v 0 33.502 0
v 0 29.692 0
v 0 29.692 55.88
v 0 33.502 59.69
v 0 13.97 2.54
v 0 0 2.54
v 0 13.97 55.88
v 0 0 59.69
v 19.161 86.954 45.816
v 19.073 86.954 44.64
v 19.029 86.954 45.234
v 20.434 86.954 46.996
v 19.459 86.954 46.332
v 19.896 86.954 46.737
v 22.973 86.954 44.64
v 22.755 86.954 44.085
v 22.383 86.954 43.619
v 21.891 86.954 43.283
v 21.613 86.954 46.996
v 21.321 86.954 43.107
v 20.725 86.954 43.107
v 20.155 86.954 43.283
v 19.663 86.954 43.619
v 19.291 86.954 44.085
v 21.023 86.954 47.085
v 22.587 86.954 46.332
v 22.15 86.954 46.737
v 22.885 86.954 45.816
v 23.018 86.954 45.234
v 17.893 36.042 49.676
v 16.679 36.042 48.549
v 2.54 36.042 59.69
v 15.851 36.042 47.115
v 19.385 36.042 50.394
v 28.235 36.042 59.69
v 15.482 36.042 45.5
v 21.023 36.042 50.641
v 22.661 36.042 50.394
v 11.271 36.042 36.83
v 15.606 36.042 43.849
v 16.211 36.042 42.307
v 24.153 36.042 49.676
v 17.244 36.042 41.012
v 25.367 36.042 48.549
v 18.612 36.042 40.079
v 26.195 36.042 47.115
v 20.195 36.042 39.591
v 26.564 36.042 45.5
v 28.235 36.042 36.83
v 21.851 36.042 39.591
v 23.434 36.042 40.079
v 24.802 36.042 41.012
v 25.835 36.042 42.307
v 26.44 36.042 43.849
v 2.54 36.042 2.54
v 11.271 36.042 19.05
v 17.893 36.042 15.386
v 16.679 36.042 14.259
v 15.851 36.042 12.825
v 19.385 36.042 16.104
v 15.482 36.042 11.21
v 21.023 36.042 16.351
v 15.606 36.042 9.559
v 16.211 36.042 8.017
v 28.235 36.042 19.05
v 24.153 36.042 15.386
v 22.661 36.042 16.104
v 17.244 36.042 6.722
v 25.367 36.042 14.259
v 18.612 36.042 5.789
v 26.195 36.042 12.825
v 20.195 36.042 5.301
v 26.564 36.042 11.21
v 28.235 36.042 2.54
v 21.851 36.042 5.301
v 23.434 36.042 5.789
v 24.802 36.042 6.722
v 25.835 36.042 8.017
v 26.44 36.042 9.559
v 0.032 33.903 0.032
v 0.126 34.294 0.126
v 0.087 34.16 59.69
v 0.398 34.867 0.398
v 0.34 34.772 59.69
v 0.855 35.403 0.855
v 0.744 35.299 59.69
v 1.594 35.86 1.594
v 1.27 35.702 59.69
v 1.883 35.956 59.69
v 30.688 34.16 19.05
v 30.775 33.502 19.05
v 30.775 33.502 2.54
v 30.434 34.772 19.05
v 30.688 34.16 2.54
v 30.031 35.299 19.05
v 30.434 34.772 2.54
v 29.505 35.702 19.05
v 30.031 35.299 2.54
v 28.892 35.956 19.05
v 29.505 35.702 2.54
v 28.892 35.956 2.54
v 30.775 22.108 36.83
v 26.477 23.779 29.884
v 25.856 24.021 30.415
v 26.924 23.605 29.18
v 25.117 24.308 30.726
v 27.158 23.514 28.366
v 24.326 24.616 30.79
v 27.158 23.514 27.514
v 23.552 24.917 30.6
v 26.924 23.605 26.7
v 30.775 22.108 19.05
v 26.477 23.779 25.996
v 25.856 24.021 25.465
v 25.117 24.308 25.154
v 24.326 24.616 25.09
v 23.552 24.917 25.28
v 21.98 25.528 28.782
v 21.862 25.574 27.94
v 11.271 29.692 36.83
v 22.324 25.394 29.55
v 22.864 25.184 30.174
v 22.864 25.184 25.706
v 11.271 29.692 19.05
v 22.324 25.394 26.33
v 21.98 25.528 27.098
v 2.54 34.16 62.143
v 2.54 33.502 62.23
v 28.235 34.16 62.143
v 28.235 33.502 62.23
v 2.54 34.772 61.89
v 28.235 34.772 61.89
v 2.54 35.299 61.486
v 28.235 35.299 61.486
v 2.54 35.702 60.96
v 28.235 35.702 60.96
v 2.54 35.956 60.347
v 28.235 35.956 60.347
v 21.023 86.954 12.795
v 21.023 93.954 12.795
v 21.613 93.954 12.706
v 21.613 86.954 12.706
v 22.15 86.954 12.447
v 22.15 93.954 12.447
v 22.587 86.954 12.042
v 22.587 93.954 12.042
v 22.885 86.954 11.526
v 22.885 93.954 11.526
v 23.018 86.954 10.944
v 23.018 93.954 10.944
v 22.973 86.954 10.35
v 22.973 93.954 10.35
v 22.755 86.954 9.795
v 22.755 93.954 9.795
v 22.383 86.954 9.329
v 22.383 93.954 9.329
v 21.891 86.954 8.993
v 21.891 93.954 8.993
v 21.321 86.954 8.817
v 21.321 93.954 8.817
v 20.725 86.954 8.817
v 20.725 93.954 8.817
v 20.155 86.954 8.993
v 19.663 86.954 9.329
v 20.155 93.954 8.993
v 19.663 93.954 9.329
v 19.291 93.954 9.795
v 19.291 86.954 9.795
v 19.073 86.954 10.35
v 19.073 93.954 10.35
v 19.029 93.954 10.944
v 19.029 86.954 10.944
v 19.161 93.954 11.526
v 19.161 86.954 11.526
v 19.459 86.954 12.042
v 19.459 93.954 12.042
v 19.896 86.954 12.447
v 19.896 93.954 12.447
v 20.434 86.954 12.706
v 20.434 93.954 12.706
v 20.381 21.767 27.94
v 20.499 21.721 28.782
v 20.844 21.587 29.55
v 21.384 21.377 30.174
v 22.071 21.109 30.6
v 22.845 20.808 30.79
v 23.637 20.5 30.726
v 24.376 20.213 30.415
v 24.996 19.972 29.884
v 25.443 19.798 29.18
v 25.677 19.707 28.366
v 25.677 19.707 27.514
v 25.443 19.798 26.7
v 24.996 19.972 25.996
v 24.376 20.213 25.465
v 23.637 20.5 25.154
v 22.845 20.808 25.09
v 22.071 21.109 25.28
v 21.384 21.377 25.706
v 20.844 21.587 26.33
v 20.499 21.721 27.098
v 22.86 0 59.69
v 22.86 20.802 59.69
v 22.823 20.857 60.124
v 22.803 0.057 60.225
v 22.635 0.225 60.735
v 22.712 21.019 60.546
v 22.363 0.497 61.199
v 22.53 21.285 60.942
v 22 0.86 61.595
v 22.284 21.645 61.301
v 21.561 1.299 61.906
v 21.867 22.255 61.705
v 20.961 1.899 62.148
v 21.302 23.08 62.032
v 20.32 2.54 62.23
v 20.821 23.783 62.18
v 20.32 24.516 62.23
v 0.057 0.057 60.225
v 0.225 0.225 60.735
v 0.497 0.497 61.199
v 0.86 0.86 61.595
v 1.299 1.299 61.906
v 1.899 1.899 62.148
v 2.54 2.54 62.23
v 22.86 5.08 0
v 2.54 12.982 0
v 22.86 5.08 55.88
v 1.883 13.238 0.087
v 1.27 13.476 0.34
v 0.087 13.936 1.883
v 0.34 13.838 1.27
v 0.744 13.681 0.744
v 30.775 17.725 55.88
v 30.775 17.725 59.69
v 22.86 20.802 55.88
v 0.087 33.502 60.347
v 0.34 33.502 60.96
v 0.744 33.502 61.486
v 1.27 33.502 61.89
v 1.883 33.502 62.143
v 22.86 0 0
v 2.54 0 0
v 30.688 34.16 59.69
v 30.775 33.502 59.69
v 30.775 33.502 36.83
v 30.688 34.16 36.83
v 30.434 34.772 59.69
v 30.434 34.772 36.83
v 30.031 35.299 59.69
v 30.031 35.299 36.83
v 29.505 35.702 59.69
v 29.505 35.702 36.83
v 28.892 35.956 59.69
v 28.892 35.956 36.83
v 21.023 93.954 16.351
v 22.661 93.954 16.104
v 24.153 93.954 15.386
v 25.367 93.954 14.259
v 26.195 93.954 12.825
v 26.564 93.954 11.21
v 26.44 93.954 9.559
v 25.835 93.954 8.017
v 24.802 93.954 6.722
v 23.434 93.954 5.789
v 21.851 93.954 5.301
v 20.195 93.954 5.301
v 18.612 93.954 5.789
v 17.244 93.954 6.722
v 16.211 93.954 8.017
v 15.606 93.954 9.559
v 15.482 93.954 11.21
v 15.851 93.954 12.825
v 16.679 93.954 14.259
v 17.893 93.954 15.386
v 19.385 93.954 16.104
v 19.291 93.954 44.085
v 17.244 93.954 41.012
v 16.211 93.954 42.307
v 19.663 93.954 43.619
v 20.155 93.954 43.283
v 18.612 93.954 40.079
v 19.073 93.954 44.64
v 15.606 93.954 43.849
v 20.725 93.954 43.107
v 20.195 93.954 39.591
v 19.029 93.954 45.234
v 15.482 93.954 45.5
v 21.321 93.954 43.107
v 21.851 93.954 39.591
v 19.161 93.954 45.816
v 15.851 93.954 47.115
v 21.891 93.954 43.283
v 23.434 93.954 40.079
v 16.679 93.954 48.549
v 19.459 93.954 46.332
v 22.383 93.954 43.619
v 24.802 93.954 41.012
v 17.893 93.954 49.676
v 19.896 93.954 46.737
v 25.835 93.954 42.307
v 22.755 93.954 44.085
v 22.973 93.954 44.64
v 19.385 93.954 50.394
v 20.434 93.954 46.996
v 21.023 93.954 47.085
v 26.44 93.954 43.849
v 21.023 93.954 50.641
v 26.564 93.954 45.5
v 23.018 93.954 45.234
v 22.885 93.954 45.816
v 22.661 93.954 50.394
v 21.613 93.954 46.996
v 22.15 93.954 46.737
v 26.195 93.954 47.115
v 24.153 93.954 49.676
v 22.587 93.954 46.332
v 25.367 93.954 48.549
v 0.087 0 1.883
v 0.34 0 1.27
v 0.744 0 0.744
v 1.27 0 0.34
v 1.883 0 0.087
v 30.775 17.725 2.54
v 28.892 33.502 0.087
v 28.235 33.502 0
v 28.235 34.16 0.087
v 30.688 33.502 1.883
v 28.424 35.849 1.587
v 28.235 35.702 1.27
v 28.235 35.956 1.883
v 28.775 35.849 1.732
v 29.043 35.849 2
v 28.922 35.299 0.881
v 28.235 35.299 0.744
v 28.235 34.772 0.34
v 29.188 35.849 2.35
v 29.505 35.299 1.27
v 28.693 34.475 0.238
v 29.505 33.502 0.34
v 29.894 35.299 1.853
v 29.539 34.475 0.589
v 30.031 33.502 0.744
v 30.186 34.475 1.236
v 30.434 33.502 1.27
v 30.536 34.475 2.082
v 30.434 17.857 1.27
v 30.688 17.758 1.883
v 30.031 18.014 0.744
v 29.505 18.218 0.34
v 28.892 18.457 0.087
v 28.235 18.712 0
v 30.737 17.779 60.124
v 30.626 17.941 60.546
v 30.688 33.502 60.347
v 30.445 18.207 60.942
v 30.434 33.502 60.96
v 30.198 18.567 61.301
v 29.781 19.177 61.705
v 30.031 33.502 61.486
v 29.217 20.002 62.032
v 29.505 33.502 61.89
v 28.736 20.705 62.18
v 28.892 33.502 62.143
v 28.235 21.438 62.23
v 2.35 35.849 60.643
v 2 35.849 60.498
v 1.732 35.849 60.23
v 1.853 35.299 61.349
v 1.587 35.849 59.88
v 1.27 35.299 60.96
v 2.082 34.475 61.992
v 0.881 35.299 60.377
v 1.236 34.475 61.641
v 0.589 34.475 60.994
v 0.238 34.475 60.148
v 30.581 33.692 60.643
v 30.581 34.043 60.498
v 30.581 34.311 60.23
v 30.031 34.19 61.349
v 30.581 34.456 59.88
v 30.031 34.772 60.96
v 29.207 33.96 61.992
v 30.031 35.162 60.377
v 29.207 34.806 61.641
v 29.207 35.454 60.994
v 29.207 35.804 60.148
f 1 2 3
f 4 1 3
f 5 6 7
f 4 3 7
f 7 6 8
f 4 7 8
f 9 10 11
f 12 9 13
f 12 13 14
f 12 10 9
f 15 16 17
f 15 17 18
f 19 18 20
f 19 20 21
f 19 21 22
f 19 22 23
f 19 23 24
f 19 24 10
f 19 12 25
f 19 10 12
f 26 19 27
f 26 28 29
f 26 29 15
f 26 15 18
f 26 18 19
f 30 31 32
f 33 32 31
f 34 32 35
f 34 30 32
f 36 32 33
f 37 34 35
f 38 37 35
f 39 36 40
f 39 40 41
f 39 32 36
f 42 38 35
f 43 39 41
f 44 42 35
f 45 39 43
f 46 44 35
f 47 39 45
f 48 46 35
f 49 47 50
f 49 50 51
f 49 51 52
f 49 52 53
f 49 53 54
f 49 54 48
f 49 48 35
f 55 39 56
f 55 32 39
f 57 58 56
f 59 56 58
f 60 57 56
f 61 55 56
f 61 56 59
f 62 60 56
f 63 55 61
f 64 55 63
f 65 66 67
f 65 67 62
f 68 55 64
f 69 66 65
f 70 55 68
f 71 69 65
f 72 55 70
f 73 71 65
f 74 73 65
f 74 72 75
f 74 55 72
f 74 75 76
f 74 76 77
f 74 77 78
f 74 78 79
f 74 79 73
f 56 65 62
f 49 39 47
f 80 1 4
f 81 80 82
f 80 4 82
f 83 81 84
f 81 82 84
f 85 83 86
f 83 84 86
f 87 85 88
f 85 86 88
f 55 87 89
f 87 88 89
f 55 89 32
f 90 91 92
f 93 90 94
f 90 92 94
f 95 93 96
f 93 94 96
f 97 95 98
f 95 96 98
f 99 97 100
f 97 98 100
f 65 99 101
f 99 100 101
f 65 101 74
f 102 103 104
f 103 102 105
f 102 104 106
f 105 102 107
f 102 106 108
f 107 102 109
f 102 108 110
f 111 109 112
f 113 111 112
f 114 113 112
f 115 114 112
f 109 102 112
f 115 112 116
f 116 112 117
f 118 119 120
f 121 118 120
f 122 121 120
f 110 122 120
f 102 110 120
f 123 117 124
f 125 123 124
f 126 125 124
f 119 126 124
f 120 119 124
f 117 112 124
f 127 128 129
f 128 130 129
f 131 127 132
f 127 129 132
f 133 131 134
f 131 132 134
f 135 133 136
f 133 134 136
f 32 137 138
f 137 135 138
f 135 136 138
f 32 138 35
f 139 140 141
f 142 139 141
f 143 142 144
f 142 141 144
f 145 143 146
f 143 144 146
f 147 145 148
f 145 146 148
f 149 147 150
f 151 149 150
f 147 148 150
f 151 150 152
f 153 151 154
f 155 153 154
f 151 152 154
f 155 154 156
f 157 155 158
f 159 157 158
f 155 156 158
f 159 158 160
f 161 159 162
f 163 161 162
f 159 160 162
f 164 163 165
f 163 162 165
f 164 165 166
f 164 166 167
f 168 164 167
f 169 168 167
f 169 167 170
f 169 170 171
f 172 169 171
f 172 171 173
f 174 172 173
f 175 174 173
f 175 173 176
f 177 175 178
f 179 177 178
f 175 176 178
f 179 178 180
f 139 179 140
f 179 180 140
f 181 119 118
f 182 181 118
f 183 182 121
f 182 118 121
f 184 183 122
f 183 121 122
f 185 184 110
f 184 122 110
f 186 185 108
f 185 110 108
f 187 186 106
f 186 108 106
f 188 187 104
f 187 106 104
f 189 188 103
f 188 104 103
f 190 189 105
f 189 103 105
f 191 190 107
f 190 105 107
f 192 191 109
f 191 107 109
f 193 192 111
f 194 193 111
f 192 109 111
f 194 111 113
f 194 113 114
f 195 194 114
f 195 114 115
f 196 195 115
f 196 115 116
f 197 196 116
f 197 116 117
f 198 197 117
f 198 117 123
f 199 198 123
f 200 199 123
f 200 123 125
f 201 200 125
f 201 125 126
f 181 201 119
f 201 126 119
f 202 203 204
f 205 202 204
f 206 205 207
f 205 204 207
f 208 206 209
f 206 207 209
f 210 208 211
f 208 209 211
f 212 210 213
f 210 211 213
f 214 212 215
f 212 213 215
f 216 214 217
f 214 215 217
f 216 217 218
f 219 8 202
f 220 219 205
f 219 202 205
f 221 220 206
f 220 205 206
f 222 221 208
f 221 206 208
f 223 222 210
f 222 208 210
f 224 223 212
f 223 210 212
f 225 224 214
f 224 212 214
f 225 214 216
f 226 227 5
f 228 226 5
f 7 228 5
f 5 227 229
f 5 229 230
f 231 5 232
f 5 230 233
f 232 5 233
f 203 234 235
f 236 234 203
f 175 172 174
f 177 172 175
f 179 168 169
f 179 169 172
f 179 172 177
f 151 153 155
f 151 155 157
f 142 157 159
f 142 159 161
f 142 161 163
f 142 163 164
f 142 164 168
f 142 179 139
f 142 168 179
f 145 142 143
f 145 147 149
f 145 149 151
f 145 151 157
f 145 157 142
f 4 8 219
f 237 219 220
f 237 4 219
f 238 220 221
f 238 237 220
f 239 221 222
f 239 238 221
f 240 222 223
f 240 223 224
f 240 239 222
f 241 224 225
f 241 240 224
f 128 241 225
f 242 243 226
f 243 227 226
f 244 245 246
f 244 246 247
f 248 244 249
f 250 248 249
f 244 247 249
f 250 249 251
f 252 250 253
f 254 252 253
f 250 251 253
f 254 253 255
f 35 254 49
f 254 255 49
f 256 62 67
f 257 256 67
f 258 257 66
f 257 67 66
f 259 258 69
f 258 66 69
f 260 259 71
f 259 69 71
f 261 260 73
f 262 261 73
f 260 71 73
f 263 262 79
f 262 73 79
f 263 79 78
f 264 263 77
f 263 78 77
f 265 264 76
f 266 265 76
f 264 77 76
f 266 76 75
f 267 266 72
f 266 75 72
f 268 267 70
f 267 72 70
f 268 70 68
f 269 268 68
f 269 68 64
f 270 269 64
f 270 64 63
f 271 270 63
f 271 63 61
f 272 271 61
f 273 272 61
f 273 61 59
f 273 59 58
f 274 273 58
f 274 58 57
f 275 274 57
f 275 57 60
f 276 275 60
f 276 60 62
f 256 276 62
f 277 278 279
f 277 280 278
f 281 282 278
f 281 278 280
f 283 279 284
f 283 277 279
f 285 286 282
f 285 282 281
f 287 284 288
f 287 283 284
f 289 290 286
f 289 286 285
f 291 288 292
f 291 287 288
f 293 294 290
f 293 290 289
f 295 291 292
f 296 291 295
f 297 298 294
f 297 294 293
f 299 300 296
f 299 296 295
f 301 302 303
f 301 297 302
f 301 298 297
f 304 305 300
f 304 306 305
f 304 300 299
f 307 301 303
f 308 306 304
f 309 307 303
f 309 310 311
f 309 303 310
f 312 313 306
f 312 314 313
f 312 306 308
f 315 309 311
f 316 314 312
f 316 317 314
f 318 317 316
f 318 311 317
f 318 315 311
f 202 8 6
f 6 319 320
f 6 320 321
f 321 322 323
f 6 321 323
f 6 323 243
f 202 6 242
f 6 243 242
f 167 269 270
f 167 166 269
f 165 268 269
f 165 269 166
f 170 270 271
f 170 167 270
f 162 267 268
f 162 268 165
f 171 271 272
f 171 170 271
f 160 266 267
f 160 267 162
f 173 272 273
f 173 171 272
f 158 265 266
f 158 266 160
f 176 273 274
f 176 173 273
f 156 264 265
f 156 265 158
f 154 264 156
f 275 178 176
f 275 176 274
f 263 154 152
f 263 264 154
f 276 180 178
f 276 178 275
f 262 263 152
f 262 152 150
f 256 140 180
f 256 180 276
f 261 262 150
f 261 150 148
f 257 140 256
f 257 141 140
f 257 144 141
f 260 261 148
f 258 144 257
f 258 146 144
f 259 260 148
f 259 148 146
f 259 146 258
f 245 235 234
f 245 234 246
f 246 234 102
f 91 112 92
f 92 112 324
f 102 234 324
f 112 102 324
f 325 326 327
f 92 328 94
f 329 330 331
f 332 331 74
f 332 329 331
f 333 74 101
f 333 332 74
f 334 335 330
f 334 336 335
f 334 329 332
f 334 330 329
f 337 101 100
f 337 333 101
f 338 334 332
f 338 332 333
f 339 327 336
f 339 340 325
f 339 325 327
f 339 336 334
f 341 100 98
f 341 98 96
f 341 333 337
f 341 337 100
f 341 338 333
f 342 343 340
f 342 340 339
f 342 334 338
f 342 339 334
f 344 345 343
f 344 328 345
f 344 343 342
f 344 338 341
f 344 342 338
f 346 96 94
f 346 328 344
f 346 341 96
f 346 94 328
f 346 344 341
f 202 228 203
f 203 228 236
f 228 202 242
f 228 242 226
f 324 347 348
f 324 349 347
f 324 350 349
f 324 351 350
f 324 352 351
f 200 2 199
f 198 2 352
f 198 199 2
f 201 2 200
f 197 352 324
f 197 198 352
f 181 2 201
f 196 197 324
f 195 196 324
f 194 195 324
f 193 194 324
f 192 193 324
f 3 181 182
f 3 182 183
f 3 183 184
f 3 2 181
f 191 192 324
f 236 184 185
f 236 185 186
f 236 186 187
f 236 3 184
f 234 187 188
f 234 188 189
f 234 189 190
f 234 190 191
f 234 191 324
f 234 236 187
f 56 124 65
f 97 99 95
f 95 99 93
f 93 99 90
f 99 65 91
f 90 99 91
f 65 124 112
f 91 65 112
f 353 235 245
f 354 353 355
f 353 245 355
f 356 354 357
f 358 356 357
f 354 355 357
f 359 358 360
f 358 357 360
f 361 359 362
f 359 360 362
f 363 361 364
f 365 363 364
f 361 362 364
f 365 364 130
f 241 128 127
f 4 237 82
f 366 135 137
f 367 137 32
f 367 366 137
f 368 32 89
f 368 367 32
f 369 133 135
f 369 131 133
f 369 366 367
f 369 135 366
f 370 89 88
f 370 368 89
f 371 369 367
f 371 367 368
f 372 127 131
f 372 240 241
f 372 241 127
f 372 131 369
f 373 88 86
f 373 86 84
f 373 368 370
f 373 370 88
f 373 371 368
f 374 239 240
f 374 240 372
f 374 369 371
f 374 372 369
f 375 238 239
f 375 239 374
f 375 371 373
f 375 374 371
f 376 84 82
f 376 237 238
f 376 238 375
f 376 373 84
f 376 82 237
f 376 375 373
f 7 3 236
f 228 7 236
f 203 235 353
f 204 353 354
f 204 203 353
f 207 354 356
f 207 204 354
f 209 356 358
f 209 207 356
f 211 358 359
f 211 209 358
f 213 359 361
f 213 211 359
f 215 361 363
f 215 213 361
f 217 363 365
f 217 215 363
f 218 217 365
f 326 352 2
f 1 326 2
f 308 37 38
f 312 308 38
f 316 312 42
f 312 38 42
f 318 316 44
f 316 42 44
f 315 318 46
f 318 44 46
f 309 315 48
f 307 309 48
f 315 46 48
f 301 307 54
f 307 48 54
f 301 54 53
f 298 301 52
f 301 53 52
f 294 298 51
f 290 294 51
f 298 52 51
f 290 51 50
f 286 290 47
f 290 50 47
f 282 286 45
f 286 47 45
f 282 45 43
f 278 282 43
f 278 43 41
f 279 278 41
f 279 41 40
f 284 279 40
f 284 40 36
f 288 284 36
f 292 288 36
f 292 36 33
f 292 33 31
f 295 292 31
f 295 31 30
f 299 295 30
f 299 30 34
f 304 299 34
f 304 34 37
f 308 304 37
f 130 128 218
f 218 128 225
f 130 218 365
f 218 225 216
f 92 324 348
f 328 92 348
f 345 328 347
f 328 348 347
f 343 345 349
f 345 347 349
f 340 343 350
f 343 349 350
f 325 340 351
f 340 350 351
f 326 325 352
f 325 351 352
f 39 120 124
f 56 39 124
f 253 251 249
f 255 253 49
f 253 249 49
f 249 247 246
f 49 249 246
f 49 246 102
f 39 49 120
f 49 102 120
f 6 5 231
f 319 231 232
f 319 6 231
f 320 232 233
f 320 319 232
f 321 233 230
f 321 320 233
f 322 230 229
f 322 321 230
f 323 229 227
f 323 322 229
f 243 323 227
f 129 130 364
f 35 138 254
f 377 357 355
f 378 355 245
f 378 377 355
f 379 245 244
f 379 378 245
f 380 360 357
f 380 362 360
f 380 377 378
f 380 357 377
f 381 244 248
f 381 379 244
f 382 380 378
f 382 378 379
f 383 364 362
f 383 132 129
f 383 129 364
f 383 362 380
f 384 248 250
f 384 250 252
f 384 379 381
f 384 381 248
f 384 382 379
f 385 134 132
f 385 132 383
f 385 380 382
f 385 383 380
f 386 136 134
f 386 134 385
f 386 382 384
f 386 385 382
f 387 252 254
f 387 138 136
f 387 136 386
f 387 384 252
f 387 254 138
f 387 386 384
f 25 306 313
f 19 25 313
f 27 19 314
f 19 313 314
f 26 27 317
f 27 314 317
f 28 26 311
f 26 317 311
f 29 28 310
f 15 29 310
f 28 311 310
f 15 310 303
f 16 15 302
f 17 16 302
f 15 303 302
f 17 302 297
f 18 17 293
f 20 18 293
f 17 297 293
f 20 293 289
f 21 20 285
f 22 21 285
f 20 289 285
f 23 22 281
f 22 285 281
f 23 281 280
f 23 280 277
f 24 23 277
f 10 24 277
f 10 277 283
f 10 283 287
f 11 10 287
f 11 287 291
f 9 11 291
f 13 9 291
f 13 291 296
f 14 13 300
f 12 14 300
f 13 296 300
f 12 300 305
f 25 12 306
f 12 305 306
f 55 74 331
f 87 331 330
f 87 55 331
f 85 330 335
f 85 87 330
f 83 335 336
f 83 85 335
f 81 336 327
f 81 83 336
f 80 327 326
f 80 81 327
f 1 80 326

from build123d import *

# Parameters (mm, degrees)
BOSS_EXTRUDE1_DEPTH = 55.88
SKETCH2_W           = 22.86
SKETCH2_H           = 29.69248518
BOSS_EXTRUDE2_DEPTH = 6.35
BOSS_EXTRUDE3_DEPTH = 55.88
CUT_EXTRUDE1_DEPTH  = 55.88
BOSS_EXTRUDE5_DEPTH = 19.05
BOSS_EXTRUDE6_DEPTH = 19.05
SKETCH8_R           = 2.8575
CUT_EXTRUDE2_DEPTH  = 4.085289
SKETCH9_R           = 5.55625
BOSS_EXTRUDE7_DEPTH = 64.262
SKETCH11_R          = 1.999996
CUT_EXTRUDE3_DEPTH  = 6.99999997
BOSS_EXTRUDE8_DEPTH = 6.35
BOSS_EXTRUDE9_DEPTH = 6.35
FILLET3_R           = 2.54


with BuildPart() as part:
    # Sketch1 → Boss-Extrude1 (new body)
    with BuildSketch(Plane.XY):
        Polygon((0, 0), (22.86, 0), (22.86, 5.08), (0, 13.97), align=None)
    extrude(amount=BOSS_EXTRUDE1_DEPTH)

    # Sketch2 → Boss-Extrude2 (add)
    with BuildSketch(Plane.XY.offset(55.88)):
        with Locations((11.43, 14.84624259)):
            Rectangle(SKETCH2_W, SKETCH2_H)
    extrude(amount=BOSS_EXTRUDE2_DEPTH)

    # Sketch3 → Boss-Extrude3 (add)
    with BuildSketch(Plane(origin=(0, 0, 55.88), x_dir=(-1, 0, 0), z_dir=(0, 0, -1))):
        Polygon((-22.86, 29.69248518), (0, 29.69248518), (-30.774794254, 17.724509637), (-30.774794254, 29.69248518), align=None)
    extrude(amount=BOSS_EXTRUDE3_DEPTH)

    # Sketch5 → Cut-Extrude1 (cut)
    with BuildSketch(Plane(origin=(0, 0, 0), x_dir=(-1, 0, 0), z_dir=(0, 0, -1))):
        Polygon((-30.774794254, 22.107844851), (-11.271433408, 29.69248518), (-30.774794254, 29.69248518), align=None)
    extrude(amount=-CUT_EXTRUDE1_DEPTH, mode=Mode.SUBTRACT)

    # Sketch7 → Boss-Extrude6 (add)
    with BuildSketch(Plane.XY.offset(55.88)):
        Polygon((30.774794254, 22.107844851), (30.774794254, 29.69248518), (11.271433408, 29.69248518), align=None)
    extrude(amount=-BOSS_EXTRUDE6_DEPTH)

    # Sketch8 → Cut-Extrude2 (cut)
    with BuildSketch(Plane(origin=(11.510866943, 29.599372139, 0), x_dir=(0.9320046715412958, -0.36244626115494866, 0), z_dir=(0.36244626115494866, 0.9320046715412958, 0))):
        with Locations(Location((13.963299783, -27.94, 0), (0, 0, 180))):
            Circle(SKETCH8_R)
    extrude(amount=-CUT_EXTRUDE2_DEPTH, mode=Mode.SUBTRACT)



with BuildPart() as body_2:
    # Sketch6 → Boss-Extrude5 (new body)
    with BuildSketch(Plane(origin=(0, 0, 0), x_dir=(-1, 0, 0), z_dir=(0, 0, -1))):
        Polygon((-30.774794254, 29.69248518), (-30.774794254, 22.107844851), (-11.271433408, 29.69248518), align=None)
    extrude(amount=-BOSS_EXTRUDE5_DEPTH)


with BuildPart() as part_1:
    add(part.part)

    add(body_2.part)  # Boss-Extrude7 merges body 2
    # Sketch9 → Boss-Extrude7 (add)
    with BuildSketch(Plane(origin=(0, 29.69248518, 0), x_dir=(1, 0, 0), z_dir=(0, 1, 0))):
        with Locations(Location((21.023113831, -10.795, 0), (0, 0, 270))):
            Circle(SKETCH9_R)
        with Locations(Location((21.023113831, -45.085, 0), (0, 0, 270))):
            Circle(SKETCH9_R)
    extrude(amount=BOSS_EXTRUDE7_DEPTH)

    # Sketch11 → Cut-Extrude3 (cut)
    with BuildSketch(Plane(origin=(0, 93.95448518, 0), x_dir=(1, 0, 0), z_dir=(0, 1, 0))):
        with Locations(Location((21.023113831, -10.795, 0), (0, 0, 270))):
            Circle(SKETCH11_R)
        with Locations(Location((21.023113831, -45.085, 0), (0, 0, 270))):
            Circle(SKETCH11_R)
    extrude(amount=-CUT_EXTRUDE3_DEPTH, mode=Mode.SUBTRACT)

    # Sketch12 → Boss-Extrude8 (add)
    with BuildSketch(Plane.XY.offset(55.88)):
        Polygon((22.86, 29.69248518), (30.774794254, 29.69248518), (30.774794254, 17.724509637), (22.86, 20.80248518), align=None)
    extrude(amount=BOSS_EXTRUDE8_DEPTH)

    # Sketch14 → Boss-Extrude9 (add)
    with BuildSketch(Plane(origin=(0, 29.69248518, 0), x_dir=(1, 0, 0), z_dir=(0, 1, 0))):
        Polygon((0, 0), (0, -62.23), (30.774794254, -62.23), (30.774794254, -36.83), (11.271433408, -36.83), (11.271433408, -19.05), (30.774794254, -19.05), (30.774794254, 0), align=None)
    extrude(amount=BOSS_EXTRUDE9_DEPTH)

    # Fillet3
    fillet3_edges = [part_1.edges().sort_by_distance(p)[0] for p in [
        (0, 18.02124259, 62.23),
        (15.387397127, 36.04248518, 62.23),
        (30.774794254, 26.883497409, 0),
        (30.774794254, 26.883497409, 62.23),
        (26.817397127, 19.263497409, 62.23),
        (22.86, 10.40124259, 62.23),
        (11.43, 0, 62.23),
        (0, 6.985, 0),
        (15.387397127, 36.04248518, 0),
        (0, 36.04248518, 31.115),
        (30.774794254, 36.04248518, 49.53),
        (30.774794254, 36.04248518, 9.525),
    ]]
    fillet(fillet3_edges, radius=FILLET3_R)


solid = part_1.part
